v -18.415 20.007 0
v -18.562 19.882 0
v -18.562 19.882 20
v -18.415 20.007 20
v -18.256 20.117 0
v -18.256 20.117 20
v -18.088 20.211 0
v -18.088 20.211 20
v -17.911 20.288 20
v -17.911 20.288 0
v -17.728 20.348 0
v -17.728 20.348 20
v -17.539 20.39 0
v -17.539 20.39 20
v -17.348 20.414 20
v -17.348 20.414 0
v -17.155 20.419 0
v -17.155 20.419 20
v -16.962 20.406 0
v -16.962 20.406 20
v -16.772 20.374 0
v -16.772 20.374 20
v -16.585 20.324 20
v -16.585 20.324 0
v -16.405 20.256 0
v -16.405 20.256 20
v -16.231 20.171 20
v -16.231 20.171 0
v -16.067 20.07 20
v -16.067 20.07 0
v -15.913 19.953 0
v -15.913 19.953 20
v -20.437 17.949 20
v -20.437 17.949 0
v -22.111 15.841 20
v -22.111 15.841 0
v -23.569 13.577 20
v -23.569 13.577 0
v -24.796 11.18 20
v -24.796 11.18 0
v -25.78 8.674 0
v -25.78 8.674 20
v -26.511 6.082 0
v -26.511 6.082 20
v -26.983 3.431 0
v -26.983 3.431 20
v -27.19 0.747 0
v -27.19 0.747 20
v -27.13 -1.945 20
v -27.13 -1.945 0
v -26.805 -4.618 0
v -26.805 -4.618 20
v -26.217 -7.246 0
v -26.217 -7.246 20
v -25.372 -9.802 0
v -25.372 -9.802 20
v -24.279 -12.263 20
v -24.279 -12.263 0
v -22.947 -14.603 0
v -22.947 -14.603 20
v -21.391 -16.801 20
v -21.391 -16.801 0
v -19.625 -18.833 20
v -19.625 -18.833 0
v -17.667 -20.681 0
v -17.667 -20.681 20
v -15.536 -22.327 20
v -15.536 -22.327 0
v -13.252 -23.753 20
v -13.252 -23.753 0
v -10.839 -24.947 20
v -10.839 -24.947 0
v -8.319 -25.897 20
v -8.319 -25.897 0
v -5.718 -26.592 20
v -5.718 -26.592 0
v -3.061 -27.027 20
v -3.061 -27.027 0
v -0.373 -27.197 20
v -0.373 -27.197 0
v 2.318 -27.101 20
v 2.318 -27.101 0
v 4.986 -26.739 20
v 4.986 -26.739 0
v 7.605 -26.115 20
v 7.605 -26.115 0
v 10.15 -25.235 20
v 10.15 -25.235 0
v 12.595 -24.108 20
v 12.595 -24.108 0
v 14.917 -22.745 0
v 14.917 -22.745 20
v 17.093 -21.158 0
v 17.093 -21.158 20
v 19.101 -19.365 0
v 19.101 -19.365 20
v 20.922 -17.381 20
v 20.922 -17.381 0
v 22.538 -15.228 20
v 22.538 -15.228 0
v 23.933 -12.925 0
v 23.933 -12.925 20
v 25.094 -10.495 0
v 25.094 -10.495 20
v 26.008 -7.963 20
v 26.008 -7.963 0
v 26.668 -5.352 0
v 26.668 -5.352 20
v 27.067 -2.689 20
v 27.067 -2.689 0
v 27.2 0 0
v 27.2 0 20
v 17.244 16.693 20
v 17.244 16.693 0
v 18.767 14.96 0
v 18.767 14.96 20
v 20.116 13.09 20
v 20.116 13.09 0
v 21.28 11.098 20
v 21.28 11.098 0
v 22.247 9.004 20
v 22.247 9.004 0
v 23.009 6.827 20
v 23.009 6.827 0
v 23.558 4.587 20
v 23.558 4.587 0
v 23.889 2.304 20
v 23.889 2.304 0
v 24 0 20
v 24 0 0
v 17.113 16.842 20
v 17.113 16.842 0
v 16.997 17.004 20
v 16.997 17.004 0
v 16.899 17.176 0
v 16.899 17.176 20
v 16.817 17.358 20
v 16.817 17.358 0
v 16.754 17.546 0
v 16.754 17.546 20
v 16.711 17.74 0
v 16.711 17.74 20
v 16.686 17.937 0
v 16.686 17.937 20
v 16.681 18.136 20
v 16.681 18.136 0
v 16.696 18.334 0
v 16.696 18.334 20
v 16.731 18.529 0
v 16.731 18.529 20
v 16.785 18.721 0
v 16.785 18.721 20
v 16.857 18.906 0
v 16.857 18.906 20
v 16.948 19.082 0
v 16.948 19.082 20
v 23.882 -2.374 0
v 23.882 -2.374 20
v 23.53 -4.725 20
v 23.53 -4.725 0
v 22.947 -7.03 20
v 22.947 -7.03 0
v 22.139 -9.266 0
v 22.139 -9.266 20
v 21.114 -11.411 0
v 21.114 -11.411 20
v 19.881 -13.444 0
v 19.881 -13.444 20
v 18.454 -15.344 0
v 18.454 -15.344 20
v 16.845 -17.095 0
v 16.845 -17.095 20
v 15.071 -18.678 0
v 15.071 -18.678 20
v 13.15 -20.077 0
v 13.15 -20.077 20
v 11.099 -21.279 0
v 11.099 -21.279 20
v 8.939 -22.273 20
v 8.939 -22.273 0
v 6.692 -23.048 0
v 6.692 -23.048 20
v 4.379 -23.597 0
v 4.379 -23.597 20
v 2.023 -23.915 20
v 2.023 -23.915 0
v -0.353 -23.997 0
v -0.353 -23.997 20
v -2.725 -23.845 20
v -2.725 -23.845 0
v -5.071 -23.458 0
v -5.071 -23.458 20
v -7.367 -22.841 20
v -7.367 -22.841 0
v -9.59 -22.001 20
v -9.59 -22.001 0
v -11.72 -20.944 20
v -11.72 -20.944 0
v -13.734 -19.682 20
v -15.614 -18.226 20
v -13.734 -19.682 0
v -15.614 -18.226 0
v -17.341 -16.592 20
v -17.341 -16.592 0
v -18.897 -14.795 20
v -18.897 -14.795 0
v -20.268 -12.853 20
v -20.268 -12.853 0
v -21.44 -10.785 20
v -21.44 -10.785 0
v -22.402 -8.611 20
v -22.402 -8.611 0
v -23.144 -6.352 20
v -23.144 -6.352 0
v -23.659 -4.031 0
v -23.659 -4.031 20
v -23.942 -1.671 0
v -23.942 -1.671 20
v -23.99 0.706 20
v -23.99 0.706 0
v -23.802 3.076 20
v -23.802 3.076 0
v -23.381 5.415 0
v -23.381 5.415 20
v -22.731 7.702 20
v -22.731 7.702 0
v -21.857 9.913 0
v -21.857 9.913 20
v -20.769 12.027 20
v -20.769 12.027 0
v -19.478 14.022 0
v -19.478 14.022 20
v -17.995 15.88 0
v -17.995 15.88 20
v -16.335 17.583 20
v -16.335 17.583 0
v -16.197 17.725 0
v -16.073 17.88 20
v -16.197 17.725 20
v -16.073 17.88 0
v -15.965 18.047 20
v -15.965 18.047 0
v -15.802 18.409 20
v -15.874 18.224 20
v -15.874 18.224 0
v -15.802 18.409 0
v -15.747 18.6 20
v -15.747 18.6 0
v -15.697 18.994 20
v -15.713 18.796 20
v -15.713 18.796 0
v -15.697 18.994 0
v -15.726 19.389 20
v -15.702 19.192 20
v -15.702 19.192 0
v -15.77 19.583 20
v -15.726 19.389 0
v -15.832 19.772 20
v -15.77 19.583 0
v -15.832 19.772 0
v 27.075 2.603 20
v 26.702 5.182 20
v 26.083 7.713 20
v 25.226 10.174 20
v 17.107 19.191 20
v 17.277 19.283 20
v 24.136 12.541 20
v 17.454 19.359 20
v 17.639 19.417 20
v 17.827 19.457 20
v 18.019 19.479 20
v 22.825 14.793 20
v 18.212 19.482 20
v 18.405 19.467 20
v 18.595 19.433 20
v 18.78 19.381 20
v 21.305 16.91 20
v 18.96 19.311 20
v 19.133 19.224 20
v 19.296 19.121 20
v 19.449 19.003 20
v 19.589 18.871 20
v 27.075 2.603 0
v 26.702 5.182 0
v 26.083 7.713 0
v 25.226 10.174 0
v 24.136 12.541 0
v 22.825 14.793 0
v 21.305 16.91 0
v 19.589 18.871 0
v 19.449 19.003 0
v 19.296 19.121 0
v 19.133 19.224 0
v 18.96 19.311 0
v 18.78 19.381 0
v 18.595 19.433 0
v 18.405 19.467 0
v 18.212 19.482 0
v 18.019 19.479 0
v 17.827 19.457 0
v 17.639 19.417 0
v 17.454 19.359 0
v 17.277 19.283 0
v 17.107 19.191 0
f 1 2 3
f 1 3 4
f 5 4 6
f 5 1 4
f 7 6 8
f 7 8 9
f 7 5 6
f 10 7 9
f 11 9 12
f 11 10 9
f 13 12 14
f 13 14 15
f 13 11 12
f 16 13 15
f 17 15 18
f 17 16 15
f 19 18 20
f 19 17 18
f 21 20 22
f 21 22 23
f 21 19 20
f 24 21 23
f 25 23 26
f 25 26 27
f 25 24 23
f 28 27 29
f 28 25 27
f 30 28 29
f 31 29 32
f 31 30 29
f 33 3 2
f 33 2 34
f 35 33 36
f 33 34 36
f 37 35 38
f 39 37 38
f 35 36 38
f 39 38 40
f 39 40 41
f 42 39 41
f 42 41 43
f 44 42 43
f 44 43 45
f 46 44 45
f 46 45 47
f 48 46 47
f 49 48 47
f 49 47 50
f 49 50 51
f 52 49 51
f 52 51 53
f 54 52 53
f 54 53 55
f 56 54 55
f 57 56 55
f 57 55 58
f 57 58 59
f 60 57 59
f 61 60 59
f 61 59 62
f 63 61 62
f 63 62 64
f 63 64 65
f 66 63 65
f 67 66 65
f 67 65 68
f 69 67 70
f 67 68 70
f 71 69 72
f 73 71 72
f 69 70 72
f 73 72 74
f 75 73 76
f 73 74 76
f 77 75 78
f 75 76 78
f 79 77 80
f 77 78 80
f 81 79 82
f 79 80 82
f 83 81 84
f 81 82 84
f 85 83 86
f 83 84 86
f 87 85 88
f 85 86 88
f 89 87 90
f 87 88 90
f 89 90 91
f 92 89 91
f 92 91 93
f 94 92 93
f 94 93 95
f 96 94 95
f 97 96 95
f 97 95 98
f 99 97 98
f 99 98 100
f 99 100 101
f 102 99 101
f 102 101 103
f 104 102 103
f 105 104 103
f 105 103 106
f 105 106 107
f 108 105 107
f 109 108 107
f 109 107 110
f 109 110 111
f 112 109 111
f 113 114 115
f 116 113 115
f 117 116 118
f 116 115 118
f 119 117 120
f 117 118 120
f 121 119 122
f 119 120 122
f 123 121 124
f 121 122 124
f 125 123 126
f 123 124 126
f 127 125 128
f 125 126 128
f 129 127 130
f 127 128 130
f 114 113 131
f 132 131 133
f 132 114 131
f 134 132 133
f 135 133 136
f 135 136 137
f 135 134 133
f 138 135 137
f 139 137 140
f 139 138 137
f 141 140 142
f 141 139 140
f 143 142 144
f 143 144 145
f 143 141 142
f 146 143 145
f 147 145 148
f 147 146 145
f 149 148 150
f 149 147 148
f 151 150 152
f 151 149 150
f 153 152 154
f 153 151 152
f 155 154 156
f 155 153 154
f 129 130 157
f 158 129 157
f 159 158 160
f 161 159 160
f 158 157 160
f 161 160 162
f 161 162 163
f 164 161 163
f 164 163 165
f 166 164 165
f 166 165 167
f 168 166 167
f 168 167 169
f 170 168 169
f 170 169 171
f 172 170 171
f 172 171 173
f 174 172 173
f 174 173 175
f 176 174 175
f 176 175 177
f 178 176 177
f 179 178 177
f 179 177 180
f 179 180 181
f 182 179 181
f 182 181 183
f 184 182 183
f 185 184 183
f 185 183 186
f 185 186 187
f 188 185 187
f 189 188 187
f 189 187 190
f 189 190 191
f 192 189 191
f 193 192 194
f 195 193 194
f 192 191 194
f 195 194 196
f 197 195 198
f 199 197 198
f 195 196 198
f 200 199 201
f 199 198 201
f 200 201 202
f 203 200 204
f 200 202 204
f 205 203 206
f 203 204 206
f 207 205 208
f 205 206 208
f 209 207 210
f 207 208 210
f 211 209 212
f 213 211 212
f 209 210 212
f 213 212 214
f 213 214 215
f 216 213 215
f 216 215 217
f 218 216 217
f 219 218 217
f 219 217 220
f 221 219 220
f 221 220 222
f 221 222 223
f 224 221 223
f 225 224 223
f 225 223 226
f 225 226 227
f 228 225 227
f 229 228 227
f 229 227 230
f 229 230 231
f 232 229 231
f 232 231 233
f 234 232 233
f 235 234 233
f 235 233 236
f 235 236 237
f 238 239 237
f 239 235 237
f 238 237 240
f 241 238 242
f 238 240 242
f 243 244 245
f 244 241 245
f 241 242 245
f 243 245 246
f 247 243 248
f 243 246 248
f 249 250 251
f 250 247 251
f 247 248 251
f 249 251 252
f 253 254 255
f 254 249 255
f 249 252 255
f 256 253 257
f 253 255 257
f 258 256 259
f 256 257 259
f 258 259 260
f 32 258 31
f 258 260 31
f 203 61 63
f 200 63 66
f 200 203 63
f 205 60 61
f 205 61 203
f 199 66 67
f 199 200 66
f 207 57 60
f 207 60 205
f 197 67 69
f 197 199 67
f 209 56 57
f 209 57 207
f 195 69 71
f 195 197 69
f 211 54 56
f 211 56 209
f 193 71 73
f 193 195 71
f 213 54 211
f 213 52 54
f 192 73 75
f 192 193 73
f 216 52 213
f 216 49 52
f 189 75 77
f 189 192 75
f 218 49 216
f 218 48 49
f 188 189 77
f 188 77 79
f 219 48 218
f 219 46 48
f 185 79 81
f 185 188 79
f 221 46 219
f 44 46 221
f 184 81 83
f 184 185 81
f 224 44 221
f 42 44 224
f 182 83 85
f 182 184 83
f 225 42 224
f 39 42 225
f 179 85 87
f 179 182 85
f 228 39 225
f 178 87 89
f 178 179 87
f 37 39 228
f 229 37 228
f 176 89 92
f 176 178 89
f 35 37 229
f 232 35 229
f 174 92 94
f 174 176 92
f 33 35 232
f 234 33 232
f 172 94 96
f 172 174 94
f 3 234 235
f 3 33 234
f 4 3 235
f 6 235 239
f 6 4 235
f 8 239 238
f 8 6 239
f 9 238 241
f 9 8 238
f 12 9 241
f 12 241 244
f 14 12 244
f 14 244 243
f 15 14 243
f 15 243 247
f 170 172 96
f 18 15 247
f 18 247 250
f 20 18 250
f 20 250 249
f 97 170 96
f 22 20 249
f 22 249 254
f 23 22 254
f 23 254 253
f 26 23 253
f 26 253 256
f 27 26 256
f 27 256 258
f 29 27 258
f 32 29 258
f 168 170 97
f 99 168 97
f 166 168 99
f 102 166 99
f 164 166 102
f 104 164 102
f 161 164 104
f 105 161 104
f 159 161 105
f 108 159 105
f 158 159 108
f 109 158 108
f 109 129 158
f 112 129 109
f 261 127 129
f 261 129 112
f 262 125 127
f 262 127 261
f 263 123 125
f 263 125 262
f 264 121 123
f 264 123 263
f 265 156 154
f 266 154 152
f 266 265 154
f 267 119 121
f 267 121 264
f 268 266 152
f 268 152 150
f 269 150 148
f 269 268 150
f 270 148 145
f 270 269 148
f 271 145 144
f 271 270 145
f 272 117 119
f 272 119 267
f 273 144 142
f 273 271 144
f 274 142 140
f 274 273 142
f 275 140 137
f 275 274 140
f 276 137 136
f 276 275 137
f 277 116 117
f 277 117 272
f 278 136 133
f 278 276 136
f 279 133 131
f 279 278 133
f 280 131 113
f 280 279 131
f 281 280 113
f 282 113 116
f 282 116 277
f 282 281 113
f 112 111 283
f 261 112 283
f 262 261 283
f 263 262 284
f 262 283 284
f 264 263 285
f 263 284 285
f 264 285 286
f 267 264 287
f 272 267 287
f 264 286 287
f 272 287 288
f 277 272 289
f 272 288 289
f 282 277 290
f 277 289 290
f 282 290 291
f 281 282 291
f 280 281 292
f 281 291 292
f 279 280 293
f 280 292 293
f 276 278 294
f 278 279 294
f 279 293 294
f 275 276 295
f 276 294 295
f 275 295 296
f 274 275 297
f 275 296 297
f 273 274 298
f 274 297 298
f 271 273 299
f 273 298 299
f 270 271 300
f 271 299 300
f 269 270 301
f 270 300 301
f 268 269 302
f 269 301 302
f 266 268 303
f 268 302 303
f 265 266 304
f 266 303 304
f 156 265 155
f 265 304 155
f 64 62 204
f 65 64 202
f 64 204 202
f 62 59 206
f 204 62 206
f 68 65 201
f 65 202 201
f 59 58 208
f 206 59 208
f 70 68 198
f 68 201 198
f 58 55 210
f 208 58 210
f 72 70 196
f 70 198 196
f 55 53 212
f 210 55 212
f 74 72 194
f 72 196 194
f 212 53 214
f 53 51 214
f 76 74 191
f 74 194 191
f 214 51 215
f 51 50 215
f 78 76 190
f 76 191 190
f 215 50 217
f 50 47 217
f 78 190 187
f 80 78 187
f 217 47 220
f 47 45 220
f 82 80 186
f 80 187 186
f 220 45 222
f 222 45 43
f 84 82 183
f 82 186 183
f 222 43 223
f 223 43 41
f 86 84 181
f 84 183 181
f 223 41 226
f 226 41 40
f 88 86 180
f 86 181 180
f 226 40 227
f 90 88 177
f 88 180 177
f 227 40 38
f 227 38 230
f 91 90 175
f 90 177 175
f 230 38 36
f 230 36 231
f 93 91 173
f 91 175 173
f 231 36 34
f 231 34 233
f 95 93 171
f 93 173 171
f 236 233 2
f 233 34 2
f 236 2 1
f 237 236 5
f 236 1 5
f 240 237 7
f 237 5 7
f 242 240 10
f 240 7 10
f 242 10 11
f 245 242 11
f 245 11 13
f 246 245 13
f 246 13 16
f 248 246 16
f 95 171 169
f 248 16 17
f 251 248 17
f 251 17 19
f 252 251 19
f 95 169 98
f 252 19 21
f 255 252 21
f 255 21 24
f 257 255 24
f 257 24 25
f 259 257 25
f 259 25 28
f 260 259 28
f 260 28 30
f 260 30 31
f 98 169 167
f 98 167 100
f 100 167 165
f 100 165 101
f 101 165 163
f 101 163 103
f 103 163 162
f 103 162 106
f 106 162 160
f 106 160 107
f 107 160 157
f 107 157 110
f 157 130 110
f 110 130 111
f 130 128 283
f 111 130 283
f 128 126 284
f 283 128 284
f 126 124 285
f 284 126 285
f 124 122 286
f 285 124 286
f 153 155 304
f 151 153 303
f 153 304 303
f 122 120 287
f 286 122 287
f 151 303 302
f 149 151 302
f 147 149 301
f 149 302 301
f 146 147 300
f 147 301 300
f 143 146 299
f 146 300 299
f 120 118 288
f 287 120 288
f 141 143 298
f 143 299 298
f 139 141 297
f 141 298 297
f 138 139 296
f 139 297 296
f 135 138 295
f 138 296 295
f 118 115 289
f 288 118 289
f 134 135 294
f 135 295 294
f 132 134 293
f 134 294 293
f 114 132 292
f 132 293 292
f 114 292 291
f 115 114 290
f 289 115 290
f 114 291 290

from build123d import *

# Parameters (mm, degrees)
F1_DEPTH    = 20
F2_T1_DEPTH = 29.6148139682
F2_T3_DEPTH = 30.8021727026


# Not quite as in the source:
# - a fillet or chamfer that OpenCascade refuses, or shapes differently, is made with other operations: its cross-section is extruded or revolved along the edge and cut away or added


with BuildPart() as f1:
    # F0 (on Top) → F1 (new body)
    with BuildSketch(Plane.XY):
        with BuildLine():
            ThreePointArc((15.9085457216, 17.9699241241), (21.8838421823, 9.8538039021), (24, 0))
            ThreePointArc((24, 0), (-10.4300926413, -21.6151143299), (-14.9344306245, 18.7873037427))
            Line((-14.9344306245, 18.7873037427), (-16.9256880412, 21.2922775751))
            ThreePointArc((-16.9256880411, 21.2922775751), (-11.8207716601, -24.4971295739), (27.2, 0))
            ThreePointArc((27.2, 0), (24.8016878066, 11.1676444224), (18.0296851511, 20.3659140073))
            Line((18.0296851511, 20.3659140073), (15.9085457216, 17.9699241241))
        make_face()
    extrude(amount=F1_DEPTH)

    # F2: fillet of radius 2 on 4 edges, made by hand

    # F2_s2 → F2_t1 (cut)
    with BuildSketch(Plane.XY.offset(-4.8074069841)):
        with BuildLine():
            ThreePointArc((-16.3353575734, 17.5828351795), (-15.7022990684, 18.8976894845), (-16.131028726, 20.2926073298))
            Line((-16.131028726, 20.2926073298), (-14.9344306245, 18.7873037427))
            ThreePointArc((-14.9344306245, 18.7873037427), (-15.6464884117, 18.1985548982), (-16.3353575734, 17.5828351795))
        make_face()
        with BuildLine():
            ThreePointArc((17.2437110419, 16.6929455011), (16.6811829734, 18.0394844298), (17.183193285, 19.4097364364))
            Line((17.183193285, 19.4097364364), (15.9085457216, 17.9699241241))
            ThreePointArc((15.9085457216, 17.9699241241), (16.5884206822, 17.3442872229), (17.2437110419, 16.6929455011))
        make_face()
    extrude(amount=F2_T1_DEPTH, mode=Mode.SUBTRACT)

    # F2_s4 → F2_t3 (cut)
    with BuildSketch(Plane.XY.offset(-5.4010863513)):
        with BuildLine():
            ThreePointArc((-18.5621612385, 19.8818050024), (-17.0493571531, 20.4144285626), (-15.6316877963, 19.6644434612))
            Line((-15.6316877963, 19.6644434612), (-16.9256880412, 21.2922775751))
            ThreePointArc((-16.9256880412, 21.2922775751), (-17.7579339971, 20.6032953713), (-18.5621612385, 19.8818050024))
        make_face()
        with BuildLine():
            ThreePointArc((19.5891550007, 18.8707447219), (18.1066850122, 19.482747002), (16.6512822795, 18.8089021064))
            Line((16.6512822795, 18.8089021064), (18.0296851511, 20.3659140073))
            ThreePointArc((18.0296851511, 20.3659140073), (18.8242706735, 19.6338186202), (19.5891550007, 18.8707447219))
        make_face()
    extrude(amount=F2_T3_DEPTH, mode=Mode.SUBTRACT)


solid = f1.part
